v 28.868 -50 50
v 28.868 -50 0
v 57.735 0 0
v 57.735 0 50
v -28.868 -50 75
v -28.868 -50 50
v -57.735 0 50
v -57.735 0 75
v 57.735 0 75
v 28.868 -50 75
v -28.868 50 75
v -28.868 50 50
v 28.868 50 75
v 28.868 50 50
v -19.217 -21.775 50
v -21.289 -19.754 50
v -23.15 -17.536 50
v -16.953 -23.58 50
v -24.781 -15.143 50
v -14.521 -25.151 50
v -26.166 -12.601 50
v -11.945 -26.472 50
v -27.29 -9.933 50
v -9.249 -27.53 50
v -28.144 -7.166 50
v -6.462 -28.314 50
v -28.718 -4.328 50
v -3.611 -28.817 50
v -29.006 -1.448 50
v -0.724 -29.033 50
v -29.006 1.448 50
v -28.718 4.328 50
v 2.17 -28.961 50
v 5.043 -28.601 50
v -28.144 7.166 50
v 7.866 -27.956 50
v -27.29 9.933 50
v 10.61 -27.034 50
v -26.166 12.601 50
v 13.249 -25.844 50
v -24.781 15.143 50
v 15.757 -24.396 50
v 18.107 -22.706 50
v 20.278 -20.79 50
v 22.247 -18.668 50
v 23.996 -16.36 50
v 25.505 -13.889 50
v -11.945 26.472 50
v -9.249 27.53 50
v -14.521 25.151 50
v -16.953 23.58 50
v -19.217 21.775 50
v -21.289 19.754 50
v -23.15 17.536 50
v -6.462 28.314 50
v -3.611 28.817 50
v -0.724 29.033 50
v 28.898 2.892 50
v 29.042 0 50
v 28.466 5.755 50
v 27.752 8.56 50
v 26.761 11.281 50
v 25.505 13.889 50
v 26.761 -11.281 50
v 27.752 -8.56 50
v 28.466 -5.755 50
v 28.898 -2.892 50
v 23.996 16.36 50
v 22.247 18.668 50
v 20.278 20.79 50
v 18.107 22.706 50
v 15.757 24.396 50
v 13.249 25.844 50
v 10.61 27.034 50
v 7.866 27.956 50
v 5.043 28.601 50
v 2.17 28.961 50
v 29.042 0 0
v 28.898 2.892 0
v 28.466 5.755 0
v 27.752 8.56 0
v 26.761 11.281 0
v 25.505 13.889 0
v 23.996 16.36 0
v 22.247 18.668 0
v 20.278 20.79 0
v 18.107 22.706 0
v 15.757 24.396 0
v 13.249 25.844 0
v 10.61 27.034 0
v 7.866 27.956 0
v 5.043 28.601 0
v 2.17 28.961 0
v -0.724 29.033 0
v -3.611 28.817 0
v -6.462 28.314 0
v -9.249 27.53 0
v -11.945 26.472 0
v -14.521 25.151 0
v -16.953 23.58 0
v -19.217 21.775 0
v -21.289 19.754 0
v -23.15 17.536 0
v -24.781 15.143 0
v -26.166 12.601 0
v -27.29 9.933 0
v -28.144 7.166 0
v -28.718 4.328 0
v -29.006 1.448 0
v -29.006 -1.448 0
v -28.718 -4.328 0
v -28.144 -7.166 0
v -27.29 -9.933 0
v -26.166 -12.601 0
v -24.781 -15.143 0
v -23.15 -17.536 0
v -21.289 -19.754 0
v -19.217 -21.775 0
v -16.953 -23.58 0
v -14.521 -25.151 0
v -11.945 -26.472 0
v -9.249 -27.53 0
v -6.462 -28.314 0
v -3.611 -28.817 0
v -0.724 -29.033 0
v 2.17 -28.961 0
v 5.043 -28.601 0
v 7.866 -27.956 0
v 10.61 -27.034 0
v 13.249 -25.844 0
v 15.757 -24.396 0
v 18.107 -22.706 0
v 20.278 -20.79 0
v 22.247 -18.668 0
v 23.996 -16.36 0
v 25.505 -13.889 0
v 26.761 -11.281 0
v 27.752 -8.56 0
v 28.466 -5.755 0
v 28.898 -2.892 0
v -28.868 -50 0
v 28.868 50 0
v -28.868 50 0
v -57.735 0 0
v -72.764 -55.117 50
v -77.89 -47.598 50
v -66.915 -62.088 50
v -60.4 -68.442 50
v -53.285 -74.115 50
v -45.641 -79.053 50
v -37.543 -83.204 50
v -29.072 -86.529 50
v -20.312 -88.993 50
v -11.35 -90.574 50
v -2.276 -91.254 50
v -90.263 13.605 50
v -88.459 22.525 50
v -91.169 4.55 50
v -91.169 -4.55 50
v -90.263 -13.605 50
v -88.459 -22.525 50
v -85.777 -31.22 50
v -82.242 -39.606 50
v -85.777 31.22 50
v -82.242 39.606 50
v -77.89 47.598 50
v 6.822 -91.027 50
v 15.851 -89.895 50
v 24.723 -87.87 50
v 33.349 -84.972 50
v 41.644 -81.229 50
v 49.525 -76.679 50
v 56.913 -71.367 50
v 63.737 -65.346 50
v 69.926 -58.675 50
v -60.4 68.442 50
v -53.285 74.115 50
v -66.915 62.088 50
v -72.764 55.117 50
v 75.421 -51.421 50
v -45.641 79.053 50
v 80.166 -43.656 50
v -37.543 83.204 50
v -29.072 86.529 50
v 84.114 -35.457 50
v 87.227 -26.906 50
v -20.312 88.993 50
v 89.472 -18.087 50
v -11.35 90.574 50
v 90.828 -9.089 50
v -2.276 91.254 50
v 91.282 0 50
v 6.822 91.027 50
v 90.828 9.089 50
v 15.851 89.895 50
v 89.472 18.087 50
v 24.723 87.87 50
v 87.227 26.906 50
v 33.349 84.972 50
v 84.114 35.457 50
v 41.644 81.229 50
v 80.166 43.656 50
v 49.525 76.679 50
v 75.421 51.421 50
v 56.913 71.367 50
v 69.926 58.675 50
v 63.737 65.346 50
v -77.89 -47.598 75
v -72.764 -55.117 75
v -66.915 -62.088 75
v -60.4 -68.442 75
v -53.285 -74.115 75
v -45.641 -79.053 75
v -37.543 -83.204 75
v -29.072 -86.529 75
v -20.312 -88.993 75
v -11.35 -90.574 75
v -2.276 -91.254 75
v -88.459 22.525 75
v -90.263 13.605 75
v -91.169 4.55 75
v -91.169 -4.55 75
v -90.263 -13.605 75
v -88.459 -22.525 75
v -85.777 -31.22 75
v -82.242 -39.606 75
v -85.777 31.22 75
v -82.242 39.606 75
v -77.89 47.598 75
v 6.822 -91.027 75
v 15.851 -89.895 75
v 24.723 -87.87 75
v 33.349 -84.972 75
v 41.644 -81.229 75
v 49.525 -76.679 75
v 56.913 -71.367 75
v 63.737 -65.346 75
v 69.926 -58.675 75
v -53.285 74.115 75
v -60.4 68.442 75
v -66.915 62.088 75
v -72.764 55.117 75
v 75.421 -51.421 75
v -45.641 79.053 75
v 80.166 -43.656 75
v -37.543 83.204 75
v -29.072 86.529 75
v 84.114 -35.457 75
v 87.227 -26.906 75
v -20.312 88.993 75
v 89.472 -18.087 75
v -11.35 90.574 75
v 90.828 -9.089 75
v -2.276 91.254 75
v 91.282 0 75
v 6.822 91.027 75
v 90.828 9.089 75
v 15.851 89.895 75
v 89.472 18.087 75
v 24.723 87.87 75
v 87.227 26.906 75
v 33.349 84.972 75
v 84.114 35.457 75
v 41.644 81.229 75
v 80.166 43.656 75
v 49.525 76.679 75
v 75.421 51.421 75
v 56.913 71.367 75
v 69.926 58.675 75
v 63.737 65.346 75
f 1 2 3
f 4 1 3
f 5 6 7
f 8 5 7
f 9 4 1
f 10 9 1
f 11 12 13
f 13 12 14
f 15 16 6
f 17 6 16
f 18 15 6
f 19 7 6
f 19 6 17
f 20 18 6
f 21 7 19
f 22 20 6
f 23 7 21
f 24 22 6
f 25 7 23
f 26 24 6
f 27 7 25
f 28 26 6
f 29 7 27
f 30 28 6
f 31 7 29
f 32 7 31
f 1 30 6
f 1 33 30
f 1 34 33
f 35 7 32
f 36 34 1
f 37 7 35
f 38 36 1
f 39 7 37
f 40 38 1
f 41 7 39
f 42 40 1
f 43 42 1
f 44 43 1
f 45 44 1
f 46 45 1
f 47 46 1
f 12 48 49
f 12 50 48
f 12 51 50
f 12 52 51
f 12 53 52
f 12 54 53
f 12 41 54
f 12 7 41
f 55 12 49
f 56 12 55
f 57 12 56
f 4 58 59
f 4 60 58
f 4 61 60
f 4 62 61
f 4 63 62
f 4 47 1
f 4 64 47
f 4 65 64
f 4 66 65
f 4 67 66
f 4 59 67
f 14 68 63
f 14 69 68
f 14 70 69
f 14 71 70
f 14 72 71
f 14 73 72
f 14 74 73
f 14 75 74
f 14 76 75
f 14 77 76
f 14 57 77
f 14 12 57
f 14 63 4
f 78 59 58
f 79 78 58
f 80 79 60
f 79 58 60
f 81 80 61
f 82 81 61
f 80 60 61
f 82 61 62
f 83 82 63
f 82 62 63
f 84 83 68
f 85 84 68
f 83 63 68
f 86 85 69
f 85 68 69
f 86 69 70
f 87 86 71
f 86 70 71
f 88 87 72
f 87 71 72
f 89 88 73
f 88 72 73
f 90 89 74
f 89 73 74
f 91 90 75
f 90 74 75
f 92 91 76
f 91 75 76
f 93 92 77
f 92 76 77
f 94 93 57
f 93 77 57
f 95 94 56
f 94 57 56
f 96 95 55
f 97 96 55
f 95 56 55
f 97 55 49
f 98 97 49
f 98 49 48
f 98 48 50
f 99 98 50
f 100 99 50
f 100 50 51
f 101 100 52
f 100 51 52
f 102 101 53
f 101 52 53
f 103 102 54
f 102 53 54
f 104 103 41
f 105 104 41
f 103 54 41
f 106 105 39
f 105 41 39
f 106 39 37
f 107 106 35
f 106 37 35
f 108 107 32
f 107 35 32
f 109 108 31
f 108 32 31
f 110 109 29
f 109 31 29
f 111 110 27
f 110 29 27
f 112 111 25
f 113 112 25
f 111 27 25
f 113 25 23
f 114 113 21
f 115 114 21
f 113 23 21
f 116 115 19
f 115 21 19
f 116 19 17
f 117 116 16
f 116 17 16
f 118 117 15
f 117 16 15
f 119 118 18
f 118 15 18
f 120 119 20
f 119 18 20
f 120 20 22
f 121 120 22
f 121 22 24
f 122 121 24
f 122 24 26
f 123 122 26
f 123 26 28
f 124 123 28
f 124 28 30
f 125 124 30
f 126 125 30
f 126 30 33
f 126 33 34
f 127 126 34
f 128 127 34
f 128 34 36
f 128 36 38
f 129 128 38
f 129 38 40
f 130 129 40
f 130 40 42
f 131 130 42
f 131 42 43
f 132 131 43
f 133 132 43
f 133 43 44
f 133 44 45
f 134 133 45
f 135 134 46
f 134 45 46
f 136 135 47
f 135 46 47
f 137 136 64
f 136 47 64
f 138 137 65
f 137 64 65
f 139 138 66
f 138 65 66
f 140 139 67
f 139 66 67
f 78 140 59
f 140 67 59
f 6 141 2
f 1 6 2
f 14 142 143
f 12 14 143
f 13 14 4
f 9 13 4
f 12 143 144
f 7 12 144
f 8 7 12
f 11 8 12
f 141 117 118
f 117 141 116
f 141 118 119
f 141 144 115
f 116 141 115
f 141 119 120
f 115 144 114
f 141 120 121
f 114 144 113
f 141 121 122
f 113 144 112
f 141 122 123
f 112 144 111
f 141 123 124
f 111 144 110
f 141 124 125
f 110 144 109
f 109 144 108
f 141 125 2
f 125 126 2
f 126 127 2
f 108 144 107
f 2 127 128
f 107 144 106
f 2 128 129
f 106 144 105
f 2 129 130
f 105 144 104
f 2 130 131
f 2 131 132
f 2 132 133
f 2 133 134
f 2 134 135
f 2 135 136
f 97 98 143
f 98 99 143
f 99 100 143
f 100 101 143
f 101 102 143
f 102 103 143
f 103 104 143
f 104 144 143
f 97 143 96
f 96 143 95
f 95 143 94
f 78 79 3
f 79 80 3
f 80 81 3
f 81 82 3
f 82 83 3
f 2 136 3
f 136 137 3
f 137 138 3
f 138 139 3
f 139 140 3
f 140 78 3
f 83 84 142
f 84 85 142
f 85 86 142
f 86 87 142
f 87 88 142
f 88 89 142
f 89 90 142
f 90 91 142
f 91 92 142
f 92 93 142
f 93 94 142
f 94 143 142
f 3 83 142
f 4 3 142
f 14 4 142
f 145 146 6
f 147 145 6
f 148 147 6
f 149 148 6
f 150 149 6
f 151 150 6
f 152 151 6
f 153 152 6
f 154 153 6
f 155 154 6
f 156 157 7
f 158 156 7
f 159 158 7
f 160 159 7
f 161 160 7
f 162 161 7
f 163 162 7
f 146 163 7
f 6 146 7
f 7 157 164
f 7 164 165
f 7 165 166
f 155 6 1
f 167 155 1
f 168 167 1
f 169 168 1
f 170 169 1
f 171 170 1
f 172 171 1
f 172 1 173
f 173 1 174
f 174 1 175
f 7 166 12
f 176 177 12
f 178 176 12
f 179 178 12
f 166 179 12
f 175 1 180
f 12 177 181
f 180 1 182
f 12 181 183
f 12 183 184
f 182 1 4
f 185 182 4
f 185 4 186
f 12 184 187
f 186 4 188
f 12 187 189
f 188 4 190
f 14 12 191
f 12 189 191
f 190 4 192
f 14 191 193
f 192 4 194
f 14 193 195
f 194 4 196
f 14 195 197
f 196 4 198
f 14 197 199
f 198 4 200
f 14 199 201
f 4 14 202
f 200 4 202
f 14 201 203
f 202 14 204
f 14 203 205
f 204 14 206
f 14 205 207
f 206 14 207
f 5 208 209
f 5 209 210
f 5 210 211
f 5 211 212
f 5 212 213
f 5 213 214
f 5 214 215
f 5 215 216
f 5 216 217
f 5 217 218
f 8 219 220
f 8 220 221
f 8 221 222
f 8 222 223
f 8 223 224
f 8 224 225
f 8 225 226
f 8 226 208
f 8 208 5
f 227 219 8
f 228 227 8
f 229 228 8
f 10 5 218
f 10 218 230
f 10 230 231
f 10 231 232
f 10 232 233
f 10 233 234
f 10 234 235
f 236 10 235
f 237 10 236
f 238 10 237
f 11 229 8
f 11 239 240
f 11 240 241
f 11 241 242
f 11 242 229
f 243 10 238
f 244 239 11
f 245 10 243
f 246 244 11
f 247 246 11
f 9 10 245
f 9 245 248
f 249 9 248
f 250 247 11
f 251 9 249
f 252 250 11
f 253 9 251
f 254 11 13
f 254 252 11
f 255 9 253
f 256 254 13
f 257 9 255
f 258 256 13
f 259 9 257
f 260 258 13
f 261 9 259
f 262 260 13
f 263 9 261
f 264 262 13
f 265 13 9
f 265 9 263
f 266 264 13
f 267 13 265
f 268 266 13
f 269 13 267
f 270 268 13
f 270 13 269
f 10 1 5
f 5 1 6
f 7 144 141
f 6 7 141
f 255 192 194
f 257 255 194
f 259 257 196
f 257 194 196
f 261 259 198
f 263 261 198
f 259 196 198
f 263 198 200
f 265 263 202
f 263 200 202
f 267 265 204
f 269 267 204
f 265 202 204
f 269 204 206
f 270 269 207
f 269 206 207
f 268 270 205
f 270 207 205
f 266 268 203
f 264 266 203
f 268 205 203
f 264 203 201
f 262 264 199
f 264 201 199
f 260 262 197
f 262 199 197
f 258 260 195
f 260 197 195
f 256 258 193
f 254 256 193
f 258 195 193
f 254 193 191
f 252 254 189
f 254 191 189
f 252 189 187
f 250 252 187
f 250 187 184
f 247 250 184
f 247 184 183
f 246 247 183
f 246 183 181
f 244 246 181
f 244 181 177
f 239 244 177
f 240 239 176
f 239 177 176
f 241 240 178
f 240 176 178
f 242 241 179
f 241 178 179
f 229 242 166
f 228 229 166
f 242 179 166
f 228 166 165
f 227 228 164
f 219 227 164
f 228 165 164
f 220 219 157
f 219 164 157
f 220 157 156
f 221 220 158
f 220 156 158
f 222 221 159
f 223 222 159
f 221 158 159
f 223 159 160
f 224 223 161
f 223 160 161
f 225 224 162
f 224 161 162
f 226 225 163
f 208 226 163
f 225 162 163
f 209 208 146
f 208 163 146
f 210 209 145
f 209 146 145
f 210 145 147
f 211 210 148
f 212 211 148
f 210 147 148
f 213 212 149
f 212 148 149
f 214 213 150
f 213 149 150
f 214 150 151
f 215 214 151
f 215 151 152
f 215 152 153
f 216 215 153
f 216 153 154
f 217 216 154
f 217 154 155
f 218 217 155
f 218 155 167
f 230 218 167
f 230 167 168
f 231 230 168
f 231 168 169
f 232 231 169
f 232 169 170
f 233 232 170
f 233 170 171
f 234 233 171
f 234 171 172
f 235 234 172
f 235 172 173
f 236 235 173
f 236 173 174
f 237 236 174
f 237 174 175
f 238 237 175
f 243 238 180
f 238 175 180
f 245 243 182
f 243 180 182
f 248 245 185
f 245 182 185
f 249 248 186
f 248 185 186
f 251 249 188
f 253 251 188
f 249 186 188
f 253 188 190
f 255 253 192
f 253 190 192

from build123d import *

# Parameters (mm, degrees)
F1_DEPTH = 50
F2_R     = 29.0419014252
F3_DEPTH = 50
F4_R     = 91.2820808401
F5_DEPTH = 25


with BuildPart() as f1:
    # F0 (on Top) → F1 (new body)
    with BuildSketch(Plane.XY):
        Polygon((28.8675134595, 50), (-28.8675134595, 50), (-57.735026919, 0), (-28.8675134595, -50), (28.8675134595, -50), (57.735026919, 0), align=None)
    extrude(amount=F1_DEPTH)

    # F2 (on face) → F3 (cut, through all)
    with BuildSketch(Plane.XY.offset(50)):
        Circle(F2_R)
    extrude(amount=-F3_DEPTH, mode=Mode.SUBTRACT)


with BuildPart() as f5:
    # F4 (on face) → F5 (new body)
    with BuildSketch(Plane.XY.offset(50)):
        Circle(F4_R)
        Polygon((28.8675134595, 50), (57.735026919, 0), (28.8675134595, -50), (-28.8675134595, -50), (-57.735026919, 0), (-28.8675134595, 50), align=None, mode=Mode.SUBTRACT)
    extrude(amount=F5_DEPTH)


solid = Compound([f1.part, f5.part])
